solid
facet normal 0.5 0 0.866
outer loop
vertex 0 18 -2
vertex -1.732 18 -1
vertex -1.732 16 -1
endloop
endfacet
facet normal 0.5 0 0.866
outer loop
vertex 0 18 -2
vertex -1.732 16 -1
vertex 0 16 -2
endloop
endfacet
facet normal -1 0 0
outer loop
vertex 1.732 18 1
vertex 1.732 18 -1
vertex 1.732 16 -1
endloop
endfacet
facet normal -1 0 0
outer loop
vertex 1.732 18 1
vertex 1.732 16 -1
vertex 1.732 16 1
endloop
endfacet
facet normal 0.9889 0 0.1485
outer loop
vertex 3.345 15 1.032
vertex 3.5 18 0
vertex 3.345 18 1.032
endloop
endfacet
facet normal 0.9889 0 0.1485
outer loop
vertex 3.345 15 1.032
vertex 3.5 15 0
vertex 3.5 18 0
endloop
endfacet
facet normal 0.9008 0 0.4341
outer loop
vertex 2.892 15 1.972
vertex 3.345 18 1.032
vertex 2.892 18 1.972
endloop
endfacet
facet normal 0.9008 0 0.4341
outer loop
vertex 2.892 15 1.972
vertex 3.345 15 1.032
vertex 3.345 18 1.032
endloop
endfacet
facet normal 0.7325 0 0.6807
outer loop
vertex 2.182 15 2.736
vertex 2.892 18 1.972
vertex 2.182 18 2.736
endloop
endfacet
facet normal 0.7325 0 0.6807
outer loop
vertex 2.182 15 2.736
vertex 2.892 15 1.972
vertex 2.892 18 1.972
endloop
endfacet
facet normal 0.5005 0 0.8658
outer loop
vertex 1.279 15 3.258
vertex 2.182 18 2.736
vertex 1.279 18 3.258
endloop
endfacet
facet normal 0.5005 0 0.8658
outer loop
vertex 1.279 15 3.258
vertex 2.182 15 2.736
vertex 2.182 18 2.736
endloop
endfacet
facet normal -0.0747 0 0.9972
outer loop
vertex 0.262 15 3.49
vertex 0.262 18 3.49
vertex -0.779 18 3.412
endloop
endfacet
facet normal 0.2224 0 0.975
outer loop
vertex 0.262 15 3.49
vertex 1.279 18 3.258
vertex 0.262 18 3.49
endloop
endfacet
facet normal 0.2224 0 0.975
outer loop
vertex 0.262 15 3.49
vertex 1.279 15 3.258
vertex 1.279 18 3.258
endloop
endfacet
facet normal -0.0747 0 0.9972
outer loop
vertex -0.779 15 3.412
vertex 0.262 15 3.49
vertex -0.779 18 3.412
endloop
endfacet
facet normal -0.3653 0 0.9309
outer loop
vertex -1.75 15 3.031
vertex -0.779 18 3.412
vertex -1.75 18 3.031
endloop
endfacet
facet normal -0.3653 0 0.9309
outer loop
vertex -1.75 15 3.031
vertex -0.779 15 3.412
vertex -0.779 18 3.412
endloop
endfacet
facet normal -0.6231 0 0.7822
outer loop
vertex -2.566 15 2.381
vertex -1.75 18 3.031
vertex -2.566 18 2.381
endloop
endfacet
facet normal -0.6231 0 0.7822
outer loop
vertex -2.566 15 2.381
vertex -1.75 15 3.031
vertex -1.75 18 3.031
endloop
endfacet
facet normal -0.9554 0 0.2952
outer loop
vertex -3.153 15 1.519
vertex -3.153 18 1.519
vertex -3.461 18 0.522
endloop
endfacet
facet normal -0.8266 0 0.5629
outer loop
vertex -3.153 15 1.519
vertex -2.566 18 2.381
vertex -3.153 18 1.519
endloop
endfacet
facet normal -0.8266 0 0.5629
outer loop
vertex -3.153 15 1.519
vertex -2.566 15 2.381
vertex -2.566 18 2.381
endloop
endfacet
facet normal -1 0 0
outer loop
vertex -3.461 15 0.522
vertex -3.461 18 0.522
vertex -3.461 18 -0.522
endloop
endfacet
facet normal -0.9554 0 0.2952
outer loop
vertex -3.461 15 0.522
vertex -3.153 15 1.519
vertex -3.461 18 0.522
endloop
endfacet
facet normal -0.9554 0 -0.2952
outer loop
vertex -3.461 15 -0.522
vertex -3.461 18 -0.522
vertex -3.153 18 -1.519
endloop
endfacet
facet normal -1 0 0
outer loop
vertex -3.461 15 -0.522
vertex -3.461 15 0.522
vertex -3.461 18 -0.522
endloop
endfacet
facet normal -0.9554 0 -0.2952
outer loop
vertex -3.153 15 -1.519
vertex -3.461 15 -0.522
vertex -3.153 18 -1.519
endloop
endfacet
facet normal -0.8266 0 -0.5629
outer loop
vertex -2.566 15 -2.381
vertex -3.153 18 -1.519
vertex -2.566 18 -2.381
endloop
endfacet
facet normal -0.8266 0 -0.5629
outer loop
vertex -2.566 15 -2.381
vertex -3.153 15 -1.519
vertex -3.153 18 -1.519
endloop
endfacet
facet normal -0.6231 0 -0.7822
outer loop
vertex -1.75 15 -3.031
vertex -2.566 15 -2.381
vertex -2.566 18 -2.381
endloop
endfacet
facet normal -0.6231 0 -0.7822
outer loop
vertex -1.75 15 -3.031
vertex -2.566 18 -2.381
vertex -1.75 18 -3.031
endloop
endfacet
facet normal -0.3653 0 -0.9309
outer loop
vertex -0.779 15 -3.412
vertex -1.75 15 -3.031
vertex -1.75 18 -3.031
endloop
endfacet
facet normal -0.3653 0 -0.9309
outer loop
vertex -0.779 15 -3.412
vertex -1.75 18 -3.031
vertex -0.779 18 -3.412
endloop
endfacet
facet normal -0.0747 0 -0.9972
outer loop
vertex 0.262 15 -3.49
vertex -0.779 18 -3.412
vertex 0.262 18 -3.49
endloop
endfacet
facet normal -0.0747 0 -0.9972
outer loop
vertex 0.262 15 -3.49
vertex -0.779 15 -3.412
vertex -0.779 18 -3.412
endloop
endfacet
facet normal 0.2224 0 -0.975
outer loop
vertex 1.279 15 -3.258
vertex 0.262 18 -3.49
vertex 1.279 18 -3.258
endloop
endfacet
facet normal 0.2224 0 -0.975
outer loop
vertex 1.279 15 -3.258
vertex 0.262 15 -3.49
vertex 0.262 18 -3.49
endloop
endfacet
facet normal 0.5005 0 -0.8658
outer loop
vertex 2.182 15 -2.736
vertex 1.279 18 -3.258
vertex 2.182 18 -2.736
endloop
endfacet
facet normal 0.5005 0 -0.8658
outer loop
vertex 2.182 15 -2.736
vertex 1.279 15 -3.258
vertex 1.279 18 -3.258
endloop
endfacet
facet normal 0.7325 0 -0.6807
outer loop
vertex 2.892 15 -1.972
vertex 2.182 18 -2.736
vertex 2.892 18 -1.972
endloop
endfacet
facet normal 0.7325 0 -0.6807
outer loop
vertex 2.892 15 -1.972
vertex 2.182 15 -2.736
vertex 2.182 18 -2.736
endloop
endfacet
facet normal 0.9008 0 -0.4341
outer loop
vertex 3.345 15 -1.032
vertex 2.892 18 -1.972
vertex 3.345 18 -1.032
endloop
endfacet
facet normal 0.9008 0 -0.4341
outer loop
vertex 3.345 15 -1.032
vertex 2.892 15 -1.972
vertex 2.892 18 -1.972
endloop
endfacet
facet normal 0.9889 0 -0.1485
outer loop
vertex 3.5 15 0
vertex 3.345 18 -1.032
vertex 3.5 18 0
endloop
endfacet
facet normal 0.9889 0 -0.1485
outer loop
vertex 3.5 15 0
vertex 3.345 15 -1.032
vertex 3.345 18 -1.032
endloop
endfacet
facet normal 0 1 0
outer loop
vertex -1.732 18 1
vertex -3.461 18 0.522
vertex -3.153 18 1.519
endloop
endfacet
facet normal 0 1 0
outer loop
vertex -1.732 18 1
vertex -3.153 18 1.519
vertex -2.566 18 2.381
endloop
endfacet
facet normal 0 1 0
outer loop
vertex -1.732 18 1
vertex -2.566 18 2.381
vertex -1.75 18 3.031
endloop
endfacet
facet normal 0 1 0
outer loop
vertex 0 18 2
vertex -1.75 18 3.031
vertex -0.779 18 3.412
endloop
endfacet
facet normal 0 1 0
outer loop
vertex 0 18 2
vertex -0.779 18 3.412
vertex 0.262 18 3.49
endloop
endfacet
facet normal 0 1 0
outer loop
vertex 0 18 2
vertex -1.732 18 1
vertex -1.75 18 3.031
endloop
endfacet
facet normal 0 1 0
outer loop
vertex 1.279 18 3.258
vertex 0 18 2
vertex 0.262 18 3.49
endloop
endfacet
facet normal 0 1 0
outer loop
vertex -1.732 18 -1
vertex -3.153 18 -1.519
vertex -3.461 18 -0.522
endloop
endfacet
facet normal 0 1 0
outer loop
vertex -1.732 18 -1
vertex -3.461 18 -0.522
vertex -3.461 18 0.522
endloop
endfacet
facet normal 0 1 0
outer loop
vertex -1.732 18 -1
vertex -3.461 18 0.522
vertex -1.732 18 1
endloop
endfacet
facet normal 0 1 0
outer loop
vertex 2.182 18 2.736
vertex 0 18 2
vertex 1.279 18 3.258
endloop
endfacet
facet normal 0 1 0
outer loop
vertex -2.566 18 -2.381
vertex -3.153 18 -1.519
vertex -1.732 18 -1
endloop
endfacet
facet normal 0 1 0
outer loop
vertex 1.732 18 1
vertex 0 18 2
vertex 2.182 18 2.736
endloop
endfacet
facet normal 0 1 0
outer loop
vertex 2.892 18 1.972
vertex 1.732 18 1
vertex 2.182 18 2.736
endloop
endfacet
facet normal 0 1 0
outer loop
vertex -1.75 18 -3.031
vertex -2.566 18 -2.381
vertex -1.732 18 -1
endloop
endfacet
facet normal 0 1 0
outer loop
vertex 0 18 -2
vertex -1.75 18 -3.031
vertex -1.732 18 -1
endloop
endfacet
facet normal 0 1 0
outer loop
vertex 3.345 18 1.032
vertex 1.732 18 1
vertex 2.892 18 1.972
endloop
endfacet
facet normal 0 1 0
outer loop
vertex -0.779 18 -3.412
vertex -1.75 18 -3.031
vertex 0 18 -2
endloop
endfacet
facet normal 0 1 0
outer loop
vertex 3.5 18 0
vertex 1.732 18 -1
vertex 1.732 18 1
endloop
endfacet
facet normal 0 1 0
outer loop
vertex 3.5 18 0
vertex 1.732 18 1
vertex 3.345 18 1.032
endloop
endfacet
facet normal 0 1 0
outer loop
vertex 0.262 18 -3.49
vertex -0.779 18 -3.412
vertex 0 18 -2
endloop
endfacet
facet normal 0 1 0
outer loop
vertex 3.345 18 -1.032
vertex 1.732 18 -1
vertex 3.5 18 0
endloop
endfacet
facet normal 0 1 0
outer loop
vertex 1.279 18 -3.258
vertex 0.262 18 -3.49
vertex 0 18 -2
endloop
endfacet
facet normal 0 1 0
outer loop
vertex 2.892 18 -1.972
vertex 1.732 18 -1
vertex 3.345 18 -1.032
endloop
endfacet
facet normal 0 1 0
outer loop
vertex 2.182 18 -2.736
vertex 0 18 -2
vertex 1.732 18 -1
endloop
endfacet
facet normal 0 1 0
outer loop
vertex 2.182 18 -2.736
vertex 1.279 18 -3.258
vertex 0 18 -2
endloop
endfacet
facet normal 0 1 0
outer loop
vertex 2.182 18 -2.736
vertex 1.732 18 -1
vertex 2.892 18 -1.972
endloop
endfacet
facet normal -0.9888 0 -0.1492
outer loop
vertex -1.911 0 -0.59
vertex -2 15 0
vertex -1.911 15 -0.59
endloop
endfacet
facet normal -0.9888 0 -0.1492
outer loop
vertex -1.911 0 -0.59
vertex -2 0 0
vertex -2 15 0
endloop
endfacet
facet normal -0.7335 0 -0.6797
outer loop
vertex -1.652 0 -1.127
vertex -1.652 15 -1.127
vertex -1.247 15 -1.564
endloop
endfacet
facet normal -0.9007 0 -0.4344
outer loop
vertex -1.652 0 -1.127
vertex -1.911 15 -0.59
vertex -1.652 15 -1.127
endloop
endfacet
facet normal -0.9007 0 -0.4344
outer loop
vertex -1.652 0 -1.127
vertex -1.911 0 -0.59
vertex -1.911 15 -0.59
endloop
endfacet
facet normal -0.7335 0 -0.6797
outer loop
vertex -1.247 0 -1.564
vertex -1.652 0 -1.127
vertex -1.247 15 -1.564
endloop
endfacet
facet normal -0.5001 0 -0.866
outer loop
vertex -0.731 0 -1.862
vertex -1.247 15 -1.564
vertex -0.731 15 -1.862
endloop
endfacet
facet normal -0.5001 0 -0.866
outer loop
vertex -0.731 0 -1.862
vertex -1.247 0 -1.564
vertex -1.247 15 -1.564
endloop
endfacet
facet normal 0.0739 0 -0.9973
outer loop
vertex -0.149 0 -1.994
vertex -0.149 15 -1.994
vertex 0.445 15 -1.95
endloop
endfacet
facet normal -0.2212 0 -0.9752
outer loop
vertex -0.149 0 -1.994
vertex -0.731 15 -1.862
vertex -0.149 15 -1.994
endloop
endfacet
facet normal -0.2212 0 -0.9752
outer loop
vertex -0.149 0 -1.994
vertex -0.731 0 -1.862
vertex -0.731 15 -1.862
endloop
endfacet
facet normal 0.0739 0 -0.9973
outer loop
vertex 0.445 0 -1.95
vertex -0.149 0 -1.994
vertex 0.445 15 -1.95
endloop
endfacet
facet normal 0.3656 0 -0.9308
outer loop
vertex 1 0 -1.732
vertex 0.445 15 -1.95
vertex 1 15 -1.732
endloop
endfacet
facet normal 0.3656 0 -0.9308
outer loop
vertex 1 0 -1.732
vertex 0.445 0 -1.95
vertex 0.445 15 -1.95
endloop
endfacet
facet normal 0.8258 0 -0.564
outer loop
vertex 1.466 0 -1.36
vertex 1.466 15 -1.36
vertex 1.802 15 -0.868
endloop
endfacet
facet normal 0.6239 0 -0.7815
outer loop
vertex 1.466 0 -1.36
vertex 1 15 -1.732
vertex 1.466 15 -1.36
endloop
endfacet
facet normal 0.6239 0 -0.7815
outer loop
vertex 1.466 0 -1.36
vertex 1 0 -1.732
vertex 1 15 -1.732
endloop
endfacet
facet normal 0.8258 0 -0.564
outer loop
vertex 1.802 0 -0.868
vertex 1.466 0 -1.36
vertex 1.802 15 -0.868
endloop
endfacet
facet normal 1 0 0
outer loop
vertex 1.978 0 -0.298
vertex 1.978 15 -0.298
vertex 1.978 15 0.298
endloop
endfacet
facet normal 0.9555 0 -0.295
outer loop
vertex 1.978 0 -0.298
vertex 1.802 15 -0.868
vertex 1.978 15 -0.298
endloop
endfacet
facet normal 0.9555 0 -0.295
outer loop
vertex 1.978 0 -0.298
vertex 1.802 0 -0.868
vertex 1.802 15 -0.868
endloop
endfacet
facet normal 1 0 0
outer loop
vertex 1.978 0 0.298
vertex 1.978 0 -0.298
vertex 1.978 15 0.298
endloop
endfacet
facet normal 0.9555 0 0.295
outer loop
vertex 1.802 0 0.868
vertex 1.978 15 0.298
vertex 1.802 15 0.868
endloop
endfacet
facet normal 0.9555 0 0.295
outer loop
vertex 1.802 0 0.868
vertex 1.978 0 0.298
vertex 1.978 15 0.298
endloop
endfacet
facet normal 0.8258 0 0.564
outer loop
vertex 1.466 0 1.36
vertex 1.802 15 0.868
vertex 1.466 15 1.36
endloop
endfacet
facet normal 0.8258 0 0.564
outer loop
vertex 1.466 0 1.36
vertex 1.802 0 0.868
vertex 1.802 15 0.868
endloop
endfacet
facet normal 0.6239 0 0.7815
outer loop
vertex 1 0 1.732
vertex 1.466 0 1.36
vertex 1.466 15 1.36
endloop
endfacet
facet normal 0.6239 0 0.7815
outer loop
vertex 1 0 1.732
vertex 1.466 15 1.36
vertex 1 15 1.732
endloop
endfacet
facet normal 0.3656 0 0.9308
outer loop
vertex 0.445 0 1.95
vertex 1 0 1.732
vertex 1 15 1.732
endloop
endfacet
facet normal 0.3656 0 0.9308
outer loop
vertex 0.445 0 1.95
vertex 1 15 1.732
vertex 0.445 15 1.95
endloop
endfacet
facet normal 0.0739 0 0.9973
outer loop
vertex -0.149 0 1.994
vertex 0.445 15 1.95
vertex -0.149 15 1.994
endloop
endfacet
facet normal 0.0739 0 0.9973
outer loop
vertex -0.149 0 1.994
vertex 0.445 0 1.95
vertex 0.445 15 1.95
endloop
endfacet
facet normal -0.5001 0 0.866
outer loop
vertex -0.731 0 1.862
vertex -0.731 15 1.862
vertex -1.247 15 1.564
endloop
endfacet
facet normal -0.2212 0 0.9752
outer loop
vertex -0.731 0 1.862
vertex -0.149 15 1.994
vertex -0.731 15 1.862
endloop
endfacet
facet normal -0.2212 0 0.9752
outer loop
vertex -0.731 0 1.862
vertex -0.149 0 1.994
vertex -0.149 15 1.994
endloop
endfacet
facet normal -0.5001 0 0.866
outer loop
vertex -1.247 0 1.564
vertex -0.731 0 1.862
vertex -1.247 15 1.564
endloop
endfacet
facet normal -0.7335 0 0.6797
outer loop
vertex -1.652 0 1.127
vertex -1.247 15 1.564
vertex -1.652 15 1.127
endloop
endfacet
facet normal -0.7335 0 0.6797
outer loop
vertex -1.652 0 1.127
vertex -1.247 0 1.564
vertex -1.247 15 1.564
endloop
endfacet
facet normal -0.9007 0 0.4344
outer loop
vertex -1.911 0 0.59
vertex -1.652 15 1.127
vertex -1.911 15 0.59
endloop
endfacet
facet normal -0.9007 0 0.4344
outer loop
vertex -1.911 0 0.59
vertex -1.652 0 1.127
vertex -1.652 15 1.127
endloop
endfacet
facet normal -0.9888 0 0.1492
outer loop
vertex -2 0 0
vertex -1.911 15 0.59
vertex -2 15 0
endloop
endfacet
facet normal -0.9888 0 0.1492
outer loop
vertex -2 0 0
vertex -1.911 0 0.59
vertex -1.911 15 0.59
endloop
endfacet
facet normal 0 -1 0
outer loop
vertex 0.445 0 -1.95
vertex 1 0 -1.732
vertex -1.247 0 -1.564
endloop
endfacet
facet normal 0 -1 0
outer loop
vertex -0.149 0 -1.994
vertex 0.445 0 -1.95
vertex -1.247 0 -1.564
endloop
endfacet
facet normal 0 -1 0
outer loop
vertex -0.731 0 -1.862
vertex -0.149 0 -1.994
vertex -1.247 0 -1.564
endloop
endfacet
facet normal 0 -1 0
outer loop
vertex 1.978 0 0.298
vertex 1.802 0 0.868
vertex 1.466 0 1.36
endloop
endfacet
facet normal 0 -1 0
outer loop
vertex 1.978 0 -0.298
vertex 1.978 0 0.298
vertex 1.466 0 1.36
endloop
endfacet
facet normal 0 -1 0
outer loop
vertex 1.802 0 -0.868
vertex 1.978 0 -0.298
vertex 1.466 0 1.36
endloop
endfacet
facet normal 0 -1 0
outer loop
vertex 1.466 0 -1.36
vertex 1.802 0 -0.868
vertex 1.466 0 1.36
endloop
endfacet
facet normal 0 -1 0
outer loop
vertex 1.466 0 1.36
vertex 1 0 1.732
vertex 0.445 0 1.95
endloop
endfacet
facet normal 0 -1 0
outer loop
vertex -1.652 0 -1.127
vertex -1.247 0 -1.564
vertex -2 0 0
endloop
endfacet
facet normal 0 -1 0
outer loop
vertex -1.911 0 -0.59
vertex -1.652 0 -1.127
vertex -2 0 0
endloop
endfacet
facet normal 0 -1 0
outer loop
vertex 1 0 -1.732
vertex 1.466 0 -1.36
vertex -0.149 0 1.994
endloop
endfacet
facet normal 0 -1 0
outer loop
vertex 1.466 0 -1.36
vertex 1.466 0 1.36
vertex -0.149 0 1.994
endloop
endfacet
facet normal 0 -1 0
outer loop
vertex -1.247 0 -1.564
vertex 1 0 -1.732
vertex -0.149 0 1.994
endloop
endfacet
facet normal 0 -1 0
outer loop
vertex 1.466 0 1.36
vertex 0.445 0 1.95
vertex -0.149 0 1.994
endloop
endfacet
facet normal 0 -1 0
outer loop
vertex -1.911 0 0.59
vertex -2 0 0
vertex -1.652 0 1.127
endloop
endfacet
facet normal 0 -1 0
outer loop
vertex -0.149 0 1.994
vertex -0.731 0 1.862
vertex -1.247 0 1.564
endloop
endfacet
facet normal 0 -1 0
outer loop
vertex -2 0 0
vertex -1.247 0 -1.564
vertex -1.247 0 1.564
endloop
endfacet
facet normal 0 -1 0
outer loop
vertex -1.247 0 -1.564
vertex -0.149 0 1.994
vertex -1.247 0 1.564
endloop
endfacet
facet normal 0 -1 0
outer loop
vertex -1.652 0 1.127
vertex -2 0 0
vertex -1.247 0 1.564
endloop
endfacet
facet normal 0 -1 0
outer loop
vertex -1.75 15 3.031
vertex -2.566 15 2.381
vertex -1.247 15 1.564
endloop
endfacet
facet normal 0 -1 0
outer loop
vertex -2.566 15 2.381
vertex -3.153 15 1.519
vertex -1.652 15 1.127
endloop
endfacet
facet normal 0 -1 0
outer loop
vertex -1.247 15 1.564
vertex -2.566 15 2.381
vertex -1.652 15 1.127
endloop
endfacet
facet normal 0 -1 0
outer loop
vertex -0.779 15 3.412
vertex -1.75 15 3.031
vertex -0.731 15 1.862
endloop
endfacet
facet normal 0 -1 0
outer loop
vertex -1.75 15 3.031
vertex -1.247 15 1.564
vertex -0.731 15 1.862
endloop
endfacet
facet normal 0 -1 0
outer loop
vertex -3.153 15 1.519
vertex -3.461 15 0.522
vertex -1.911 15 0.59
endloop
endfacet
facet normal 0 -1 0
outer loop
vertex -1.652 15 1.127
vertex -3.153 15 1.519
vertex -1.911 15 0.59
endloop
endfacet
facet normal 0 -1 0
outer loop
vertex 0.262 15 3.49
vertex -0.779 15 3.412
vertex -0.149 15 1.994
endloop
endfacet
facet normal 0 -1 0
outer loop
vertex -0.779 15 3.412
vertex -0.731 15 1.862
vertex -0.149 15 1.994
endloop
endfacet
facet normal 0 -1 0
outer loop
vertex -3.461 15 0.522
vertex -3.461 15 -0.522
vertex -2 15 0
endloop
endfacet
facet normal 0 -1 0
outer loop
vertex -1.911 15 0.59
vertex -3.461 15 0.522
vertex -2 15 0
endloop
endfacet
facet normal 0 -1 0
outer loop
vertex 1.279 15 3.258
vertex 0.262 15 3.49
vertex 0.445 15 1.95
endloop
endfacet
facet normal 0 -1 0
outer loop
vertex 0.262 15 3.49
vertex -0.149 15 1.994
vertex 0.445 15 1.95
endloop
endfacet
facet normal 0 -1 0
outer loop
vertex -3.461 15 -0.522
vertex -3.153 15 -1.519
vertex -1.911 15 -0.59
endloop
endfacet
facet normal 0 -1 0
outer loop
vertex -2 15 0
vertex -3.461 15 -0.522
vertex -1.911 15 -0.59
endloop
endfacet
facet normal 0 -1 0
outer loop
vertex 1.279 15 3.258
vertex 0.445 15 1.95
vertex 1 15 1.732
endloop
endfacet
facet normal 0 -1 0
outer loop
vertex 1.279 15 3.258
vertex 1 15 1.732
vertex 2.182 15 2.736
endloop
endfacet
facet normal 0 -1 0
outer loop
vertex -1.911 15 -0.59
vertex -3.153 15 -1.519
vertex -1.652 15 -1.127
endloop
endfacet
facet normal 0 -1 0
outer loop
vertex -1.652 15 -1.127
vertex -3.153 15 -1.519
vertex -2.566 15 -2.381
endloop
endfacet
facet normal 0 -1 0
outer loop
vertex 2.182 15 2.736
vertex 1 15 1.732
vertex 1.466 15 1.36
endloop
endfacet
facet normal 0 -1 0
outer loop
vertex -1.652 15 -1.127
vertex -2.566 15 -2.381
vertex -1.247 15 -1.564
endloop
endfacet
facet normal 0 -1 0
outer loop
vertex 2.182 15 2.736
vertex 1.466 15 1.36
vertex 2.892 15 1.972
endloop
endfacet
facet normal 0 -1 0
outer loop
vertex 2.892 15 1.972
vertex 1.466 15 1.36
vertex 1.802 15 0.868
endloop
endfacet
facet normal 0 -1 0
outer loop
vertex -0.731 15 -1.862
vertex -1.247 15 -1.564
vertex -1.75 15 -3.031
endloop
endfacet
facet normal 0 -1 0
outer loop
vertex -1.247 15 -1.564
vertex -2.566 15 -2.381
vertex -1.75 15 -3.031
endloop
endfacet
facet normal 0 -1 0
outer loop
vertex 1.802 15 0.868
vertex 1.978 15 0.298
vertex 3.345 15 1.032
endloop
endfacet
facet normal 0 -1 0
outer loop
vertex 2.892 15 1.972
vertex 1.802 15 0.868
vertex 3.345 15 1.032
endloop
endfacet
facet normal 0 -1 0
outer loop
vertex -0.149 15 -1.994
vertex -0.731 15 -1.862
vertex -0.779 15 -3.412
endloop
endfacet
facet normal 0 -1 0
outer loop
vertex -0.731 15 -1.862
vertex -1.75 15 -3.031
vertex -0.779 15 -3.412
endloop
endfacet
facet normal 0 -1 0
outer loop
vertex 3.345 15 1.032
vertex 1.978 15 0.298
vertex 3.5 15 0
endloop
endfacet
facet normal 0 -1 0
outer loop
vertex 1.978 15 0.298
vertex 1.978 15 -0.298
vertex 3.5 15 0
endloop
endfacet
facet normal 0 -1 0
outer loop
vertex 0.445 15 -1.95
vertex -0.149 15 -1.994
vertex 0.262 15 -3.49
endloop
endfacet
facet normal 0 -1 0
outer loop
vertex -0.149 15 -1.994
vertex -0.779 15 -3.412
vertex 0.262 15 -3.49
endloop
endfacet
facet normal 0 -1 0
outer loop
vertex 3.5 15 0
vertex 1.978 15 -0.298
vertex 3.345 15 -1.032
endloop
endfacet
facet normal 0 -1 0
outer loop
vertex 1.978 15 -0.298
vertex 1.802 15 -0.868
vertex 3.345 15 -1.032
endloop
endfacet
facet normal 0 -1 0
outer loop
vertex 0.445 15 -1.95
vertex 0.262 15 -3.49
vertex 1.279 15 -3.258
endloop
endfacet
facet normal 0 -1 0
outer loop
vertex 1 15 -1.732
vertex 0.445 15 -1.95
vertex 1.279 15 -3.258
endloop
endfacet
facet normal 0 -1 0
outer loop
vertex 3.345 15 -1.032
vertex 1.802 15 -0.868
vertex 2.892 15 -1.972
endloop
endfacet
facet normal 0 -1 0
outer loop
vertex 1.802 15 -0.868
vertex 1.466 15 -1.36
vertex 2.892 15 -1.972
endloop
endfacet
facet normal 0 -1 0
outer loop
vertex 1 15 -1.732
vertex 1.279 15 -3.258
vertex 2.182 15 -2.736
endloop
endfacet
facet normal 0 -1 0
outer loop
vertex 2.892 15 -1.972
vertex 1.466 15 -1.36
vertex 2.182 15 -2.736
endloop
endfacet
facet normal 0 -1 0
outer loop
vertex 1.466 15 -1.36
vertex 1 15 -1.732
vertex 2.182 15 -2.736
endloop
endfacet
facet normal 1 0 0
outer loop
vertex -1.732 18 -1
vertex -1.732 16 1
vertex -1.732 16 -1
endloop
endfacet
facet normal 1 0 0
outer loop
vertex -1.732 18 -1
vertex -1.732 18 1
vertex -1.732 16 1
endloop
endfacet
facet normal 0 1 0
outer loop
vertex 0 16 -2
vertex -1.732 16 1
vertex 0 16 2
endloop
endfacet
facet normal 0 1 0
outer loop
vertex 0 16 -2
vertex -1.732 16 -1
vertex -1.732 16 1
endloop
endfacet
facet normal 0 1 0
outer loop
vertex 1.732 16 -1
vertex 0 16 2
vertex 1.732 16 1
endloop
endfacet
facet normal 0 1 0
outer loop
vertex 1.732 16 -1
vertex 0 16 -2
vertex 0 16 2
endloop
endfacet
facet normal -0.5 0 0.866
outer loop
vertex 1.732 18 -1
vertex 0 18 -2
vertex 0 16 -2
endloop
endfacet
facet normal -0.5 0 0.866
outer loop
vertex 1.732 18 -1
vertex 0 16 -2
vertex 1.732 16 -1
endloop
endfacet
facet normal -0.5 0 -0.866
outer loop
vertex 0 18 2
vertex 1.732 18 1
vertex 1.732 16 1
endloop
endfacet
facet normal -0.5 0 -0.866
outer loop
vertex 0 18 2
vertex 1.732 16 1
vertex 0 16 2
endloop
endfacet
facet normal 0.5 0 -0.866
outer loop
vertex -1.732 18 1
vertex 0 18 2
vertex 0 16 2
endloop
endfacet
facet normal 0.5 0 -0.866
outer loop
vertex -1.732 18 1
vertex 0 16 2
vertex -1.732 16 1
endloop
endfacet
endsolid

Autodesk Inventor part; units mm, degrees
ref_plane "YZ Plane" through (0, 0, 0) normal (1, 0, 0) x (0, 1, 0)
ref_plane "XZ Plane" through (0, 0, 0) normal (0, 1, 0) x (-1, 0, 0)
ref_plane "XY Plane" through (0, 0, 0) normal (0, 0, 1) x (1, 0, 0)
sketch "草圖1" plane through (0, 0, 0) normal (0, 1, 0) x (-1, 0, 0)
  circle A0 centre (0, 0) radius 2
  dimension "d0" = 4
extrude "擠出1" add sketch "草圖1" along normal blind 15
sketch "草圖2" plane through (0, 15, 0) normal (0, 1, 0) x (1, 0, 0)
  circle A0 centre (0, 0) radius 3.5
  dimension "d3" = 7
extrude "擠出2" add sketch "草圖2" along normal blind 3
sketch "草圖3" plane through (0, 18, 0) normal (0, 1, 0) x (1, 0, 0)
  circle A0 centre (0, 0) radius 2 projected
  line L0 (0, 2) -> (1.7321, 1)
  line L1 (1.7321, 1) -> (1.7321, -1)
  line L2 (1.7321, -1) -> (0, -2)
  line L3 (0, -2) -> (-1.7321, -1)
  line L4 (-1.7321, -1) -> (-1.7321, 1)
  line L5 (-1.7321, 1) -> (0, 2)
extrude "擠出3" cut sketch "草圖3" against normal blind 2 contours L1 L2 L3 L4 L5 L0
thread "螺紋1" size "M4x0.7" class "6g" standard "ANSI Metric M Profile" full length
properties part number "M4set_screw"
